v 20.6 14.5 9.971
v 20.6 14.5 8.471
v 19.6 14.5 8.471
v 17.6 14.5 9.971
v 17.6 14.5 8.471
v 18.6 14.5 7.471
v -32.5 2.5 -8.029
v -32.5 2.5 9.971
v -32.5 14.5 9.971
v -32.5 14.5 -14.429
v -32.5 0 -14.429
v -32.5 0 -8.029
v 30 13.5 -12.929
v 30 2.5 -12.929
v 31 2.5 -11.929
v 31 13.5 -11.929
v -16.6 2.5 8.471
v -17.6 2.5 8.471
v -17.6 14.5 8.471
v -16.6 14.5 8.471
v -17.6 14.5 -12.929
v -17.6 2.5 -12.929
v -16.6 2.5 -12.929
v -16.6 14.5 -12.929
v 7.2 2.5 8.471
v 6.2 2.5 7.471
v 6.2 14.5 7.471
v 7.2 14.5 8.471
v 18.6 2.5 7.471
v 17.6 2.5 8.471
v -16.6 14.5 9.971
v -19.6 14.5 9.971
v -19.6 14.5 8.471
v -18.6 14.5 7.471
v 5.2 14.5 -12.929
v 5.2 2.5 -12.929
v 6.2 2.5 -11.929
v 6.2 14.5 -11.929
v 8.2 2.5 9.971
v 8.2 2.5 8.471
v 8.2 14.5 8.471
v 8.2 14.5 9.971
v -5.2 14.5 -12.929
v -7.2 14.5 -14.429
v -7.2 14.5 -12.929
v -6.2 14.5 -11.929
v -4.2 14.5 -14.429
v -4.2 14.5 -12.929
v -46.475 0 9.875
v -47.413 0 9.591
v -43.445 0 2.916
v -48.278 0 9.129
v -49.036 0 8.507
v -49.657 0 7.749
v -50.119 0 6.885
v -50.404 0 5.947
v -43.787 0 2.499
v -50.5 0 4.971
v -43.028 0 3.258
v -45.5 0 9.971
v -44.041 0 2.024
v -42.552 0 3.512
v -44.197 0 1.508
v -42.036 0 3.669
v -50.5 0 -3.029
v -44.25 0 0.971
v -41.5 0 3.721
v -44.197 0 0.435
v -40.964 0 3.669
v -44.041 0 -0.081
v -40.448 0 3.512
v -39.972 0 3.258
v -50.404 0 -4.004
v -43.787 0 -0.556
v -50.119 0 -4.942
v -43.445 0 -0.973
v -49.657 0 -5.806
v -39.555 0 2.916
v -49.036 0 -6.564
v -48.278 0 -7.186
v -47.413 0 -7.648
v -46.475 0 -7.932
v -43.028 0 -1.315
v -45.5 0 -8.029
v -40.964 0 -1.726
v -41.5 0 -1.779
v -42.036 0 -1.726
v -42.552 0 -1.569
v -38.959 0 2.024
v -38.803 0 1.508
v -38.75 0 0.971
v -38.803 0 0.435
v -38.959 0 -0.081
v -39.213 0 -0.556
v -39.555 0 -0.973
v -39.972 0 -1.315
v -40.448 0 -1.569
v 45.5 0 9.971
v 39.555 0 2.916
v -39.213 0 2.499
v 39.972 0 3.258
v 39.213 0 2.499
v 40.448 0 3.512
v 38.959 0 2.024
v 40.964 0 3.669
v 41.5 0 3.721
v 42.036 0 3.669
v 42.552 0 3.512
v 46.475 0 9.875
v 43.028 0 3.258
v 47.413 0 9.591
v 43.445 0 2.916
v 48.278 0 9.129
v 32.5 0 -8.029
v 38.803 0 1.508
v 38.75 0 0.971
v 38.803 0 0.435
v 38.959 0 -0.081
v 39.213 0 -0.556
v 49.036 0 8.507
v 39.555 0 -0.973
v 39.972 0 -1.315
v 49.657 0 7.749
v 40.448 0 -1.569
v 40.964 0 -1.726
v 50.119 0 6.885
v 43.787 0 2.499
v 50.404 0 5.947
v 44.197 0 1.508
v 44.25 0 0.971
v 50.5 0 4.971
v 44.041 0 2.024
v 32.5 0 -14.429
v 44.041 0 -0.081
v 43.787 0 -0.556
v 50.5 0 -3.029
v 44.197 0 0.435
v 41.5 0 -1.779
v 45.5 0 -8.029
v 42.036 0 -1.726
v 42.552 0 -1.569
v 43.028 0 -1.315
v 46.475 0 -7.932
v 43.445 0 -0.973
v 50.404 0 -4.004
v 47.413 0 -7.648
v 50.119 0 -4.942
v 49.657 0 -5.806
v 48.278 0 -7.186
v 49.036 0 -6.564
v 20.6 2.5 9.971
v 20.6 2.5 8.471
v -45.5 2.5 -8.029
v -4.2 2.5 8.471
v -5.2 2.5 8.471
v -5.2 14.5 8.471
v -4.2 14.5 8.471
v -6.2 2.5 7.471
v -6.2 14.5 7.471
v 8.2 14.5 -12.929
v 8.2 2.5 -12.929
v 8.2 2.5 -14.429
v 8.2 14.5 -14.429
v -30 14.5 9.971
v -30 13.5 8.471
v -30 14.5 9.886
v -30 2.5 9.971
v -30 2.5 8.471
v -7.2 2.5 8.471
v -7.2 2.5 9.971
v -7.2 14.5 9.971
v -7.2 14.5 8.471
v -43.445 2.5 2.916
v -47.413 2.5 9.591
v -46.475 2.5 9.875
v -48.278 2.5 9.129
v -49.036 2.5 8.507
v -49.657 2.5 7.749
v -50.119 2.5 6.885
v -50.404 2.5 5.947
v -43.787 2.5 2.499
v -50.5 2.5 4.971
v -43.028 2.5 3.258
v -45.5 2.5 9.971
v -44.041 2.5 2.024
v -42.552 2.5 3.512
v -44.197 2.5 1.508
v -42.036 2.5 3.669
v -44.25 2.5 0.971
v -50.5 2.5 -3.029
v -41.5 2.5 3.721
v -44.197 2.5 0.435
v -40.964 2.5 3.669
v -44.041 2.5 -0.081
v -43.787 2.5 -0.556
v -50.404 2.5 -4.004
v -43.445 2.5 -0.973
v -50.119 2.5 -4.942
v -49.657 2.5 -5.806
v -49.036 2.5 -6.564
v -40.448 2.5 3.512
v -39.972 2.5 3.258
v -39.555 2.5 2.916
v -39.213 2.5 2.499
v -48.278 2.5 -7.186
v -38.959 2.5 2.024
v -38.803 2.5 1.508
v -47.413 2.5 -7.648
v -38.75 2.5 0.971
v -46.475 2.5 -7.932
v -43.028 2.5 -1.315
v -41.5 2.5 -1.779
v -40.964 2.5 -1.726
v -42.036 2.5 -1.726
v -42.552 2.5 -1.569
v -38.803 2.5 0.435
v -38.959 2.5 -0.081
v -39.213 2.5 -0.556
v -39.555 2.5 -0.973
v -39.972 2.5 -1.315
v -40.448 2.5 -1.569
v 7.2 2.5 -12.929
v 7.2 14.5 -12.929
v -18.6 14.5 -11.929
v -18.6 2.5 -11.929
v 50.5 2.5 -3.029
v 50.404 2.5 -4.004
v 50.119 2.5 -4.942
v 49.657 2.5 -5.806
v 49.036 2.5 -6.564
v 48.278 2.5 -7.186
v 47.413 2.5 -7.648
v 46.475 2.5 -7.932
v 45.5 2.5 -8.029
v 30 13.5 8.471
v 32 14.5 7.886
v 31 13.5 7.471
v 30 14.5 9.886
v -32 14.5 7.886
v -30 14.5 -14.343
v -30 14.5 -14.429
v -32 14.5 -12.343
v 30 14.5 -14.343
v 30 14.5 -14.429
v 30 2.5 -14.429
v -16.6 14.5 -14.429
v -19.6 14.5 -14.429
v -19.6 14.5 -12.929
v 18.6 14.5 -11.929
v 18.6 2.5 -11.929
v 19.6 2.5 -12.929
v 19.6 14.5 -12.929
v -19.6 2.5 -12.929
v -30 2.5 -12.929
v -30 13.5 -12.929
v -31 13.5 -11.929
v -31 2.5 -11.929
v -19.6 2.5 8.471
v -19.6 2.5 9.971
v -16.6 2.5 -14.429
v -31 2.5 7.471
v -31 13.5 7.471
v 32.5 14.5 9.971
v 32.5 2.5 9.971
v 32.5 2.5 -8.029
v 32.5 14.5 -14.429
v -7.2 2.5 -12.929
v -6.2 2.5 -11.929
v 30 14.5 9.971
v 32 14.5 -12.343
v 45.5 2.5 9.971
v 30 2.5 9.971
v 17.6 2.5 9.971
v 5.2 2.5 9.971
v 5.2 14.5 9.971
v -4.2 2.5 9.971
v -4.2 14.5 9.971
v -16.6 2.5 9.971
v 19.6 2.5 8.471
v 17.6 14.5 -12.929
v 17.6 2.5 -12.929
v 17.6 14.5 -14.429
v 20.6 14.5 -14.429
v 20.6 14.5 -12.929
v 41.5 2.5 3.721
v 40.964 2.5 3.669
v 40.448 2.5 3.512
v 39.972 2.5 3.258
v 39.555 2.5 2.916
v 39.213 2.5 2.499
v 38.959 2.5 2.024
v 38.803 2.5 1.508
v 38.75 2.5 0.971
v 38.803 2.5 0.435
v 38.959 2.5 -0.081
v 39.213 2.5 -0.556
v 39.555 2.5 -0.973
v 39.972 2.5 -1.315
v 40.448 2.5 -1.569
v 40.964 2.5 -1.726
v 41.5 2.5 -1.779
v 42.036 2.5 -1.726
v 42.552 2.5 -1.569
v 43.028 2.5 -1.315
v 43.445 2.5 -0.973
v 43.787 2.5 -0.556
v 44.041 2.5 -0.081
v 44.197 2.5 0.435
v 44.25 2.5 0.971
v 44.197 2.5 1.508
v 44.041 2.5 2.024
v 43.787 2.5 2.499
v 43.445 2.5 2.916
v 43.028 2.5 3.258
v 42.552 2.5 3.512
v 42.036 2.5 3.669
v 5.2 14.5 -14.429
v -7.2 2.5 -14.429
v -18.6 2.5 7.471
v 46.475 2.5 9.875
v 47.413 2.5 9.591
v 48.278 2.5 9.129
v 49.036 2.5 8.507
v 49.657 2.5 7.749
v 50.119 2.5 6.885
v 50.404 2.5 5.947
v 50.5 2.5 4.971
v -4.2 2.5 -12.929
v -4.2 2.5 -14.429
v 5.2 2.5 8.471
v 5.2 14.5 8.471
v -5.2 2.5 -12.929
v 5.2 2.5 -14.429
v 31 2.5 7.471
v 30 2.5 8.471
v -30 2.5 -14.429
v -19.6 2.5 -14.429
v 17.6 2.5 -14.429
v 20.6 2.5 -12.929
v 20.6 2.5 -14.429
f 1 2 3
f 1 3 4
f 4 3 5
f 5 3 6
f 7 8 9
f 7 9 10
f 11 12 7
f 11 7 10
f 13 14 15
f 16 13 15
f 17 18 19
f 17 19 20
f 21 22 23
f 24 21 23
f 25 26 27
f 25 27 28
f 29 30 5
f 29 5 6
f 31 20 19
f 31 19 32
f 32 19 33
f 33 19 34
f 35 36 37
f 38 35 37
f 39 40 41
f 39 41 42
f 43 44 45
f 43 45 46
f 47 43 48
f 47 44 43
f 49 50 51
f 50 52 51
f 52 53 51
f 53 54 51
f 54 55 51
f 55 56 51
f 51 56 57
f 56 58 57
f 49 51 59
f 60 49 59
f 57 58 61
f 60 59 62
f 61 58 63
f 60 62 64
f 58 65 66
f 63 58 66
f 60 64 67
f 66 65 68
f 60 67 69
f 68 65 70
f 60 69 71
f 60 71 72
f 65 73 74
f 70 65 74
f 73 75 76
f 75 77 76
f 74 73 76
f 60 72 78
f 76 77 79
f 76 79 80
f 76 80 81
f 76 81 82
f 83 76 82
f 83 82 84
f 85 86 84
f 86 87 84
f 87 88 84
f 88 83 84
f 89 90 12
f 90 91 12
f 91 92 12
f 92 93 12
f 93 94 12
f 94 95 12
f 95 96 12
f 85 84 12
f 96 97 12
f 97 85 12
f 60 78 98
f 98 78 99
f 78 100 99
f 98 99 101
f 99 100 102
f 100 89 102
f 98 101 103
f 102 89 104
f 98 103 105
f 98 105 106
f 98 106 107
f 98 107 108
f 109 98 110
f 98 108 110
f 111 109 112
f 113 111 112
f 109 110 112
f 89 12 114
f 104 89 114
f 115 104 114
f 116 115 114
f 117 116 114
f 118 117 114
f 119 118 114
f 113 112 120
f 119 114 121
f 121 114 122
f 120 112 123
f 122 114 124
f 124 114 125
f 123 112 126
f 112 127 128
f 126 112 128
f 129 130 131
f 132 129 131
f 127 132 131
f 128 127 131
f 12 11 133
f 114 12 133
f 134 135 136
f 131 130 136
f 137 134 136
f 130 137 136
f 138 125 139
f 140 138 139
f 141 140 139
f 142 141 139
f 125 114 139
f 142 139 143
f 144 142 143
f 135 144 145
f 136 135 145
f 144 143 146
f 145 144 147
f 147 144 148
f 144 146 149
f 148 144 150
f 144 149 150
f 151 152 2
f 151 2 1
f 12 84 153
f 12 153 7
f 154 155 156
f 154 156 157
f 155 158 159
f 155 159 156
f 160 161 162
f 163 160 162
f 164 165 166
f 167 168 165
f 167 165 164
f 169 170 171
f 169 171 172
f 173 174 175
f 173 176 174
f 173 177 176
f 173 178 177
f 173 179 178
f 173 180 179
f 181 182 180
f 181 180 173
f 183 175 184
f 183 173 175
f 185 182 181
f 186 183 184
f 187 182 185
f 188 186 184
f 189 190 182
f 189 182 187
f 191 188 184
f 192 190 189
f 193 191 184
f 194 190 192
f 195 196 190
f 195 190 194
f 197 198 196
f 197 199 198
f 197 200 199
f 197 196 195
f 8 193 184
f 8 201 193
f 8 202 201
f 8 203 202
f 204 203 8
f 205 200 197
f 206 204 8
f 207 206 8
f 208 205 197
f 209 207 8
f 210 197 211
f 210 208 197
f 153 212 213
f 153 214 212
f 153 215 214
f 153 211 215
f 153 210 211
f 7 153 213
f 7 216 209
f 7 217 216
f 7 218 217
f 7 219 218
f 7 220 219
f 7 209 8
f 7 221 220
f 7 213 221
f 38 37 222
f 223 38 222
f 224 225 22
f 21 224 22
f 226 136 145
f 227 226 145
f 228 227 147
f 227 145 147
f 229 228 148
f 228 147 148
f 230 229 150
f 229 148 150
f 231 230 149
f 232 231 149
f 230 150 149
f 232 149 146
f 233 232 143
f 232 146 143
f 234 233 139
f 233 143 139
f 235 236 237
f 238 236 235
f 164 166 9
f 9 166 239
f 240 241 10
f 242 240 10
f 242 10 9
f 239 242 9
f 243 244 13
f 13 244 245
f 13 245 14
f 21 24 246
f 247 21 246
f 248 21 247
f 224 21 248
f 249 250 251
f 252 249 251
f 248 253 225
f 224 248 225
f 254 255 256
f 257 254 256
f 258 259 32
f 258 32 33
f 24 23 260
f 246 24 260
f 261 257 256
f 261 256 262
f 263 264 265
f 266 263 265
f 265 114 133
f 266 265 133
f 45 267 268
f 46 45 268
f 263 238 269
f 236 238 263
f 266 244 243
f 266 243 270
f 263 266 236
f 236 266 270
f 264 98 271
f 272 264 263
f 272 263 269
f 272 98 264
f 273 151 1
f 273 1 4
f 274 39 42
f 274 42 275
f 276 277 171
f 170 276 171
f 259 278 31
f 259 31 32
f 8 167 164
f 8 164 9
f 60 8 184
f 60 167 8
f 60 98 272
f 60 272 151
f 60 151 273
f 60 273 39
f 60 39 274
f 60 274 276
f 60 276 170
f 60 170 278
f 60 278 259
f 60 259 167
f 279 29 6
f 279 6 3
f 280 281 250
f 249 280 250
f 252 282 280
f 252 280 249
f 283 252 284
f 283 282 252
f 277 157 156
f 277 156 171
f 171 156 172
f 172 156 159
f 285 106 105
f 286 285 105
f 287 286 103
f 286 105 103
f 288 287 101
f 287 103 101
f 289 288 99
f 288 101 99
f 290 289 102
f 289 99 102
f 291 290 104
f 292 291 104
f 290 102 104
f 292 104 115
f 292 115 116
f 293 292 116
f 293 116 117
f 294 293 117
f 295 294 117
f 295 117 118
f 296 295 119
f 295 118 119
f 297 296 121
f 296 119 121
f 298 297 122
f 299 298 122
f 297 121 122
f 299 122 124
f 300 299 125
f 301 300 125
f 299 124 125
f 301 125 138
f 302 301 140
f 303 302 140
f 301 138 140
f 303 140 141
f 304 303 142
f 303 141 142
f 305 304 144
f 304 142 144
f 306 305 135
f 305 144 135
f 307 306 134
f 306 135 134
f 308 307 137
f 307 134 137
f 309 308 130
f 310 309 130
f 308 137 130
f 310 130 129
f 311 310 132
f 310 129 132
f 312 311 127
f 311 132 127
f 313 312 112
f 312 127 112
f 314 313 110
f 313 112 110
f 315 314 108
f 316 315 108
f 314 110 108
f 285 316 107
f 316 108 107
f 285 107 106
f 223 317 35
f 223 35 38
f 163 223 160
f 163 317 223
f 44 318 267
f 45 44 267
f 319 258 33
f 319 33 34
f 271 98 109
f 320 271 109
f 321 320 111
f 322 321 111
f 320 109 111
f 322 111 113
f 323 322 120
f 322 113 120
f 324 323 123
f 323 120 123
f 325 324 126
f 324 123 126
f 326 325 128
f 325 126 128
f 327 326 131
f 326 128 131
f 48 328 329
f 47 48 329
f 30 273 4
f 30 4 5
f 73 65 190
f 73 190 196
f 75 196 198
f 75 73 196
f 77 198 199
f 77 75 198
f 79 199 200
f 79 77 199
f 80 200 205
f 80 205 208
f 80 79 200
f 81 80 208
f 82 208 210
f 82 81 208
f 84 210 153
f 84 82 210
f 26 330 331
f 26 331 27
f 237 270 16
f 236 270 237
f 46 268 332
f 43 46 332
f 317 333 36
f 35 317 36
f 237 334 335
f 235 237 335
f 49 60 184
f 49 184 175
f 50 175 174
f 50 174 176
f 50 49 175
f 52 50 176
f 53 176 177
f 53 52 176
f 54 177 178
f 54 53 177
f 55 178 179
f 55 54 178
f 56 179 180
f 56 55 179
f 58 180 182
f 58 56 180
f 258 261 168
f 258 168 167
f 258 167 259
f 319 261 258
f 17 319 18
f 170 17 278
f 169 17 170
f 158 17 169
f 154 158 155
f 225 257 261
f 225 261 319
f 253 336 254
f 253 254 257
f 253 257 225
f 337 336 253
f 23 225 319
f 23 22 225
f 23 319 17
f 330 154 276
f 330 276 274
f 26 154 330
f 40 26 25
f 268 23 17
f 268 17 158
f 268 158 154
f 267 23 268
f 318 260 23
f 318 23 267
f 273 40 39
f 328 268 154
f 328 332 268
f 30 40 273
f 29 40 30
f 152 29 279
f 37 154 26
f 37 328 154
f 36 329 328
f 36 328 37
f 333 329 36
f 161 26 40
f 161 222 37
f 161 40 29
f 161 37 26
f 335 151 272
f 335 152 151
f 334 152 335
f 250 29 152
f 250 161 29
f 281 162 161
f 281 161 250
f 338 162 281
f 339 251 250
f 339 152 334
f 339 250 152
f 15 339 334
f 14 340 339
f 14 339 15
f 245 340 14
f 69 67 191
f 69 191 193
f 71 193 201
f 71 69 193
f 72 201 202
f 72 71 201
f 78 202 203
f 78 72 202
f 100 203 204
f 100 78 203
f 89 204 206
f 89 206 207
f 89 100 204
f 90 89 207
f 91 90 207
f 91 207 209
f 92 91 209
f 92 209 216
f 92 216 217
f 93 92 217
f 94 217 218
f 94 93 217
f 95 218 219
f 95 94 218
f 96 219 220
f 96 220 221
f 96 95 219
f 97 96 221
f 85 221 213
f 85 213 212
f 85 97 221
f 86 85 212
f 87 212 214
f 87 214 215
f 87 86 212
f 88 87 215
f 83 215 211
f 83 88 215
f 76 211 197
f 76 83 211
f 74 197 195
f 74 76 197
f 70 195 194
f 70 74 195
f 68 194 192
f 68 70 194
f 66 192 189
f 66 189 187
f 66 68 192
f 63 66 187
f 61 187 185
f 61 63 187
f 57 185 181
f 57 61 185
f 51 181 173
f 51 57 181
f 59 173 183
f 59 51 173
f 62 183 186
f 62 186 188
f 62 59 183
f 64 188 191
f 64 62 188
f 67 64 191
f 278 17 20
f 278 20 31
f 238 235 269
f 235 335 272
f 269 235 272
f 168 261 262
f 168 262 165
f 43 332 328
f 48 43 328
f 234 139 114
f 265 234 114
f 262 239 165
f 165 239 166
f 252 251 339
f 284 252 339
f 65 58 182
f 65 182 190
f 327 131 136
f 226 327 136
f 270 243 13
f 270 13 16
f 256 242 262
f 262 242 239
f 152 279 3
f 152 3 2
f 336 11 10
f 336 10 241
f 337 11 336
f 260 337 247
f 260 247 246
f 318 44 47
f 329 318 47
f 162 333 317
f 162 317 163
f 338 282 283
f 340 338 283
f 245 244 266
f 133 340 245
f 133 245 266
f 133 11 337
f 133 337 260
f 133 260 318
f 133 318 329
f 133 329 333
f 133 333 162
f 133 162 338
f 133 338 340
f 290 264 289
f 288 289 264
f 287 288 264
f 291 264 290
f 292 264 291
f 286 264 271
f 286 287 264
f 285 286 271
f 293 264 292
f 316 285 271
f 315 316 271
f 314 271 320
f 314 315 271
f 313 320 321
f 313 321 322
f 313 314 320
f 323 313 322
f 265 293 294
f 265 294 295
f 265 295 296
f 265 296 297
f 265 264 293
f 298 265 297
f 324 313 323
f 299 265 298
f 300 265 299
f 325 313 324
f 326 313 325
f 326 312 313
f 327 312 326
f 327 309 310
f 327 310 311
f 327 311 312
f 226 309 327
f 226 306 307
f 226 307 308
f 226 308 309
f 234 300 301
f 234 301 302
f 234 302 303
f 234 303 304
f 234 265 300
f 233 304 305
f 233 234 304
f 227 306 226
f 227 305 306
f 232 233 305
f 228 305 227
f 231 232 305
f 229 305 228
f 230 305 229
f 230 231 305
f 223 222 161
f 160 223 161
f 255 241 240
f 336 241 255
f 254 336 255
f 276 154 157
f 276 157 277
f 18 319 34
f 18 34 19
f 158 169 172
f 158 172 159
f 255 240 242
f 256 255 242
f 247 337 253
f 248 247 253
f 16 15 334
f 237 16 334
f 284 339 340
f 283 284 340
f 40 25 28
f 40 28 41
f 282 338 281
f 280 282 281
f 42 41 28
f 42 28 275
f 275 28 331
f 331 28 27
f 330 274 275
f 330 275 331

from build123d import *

# Parameters (mm, degrees)
SKETCH_1_W                    = 65
SKETCH_1_H                    = 24.4
EXTRUDE_1_DEPTH               = 2.5
SKETCH_2_R                    = 2.75
EXTRUDE_2_DEPTH               = 2.5
EXTRUDE_3_DEPTH               = 12
CHAMFER_1_SIZE                = 1
EXTRUDE_4_DEPTH               = 12
PATTERN_LINEAR_1_COUNT        = 4
PATTERN_LINEAR_1_PITCH        = 12.4
PATTERN_LINEAR_1_COPY_1_DEPTH = 12
PATTERN_LINEAR_1_COPY_2_DEPTH = 12
PATTERN_LINEAR_1_COPY_3_DEPTH = 12


with BuildPart() as part:
    # Эскиз1 → Бобышка-Вытянуть1 (new body)
    with BuildSketch(Plane(origin=(0, 0, 0), x_dir=(1, 0, 0), z_dir=(0, 1, 0))):
        with Locations((0, 2.228571429)):
            Rectangle(SKETCH_1_W, SKETCH_1_H)
    extrude(amount=EXTRUDE_1_DEPTH)

    # Эскиз2 → Бобышка-Вытянуть2 (add)
    with BuildSketch(Plane(origin=(0, 0, 0), x_dir=(1, 0, 0), z_dir=(0, 1, 0))):
        with BuildLine():
            Line((-32.5, -9.971428571), (-45.5, -9.971428571))
            ThreePointArc((-45.5, -9.971428571), (-49.035533906, -8.506962477), (-50.5, -4.971428571))
            Line((-50.5, -4.971428571), (-50.5, 3.028571429))
            ThreePointArc((-50.5, 3.028571429), (-49.035533906, 6.564105335), (-45.5, 8.028571429))
            Line((-45.5, 8.028571429), (-32.5, 8.028571429))
            Line((-32.5, 8.028571429), (-32.5, -9.971428571))
        make_face()
        with Locations(Location((-41.5, -0.971428571, 0), (0, 0, 270))):
            Circle(SKETCH_2_R, mode=Mode.SUBTRACT)
    extrude_2 = extrude(amount=EXTRUDE_2_DEPTH)

    # Зеркальное отражение1: Бобышка-Вытянуть2 across plane
    add(extrude_2.mirror(Plane(origin=(0, 0, 0), x_dir=(0, 0, 1), z_dir=(1, 0, 0))))

    # Эскиз3 → Бобышка-Вытянуть3 (add)
    with BuildSketch(Plane(origin=(0, 2.5, 0), x_dir=(1, 0, 0), z_dir=(0, 1, 0))):
        Polygon((-32.5, 14.428571429), (-31, 14.428571429), (-30, 14.428571429), (-30, 12.928571429), (-31, 11.928571429), (-31, -7.471428571), (-30, -8.471428571), (-30, -9.971428571), (-31, -9.971428571), (-32.5, -9.971428571), align=None)
    extrude_3 = extrude(amount=EXTRUDE_3_DEPTH)

    # Зеркальное отражение2: Бобышка-Вытянуть3 across plane
    add(extrude_3.mirror(Plane(origin=(0, 0, 0), x_dir=(0, 0, 1), z_dir=(1, 0, 0))))

    # Фаска1
    chamfer_1_edges = [part.edges().sort_by_distance(p)[0] for p in [
        (-30.5, 14.5, 7.971428571),
        (-31, 14.5, -2.228571429),
        (-30.5, 14.5, -12.428571429),
        (30.5, 14.5, -12.428571429),
        (31, 14.5, -2.228571429),
        (30.5, 14.5, 7.971428571),
    ]]
    chamfer(chamfer_1_edges, length=CHAMFER_1_SIZE)

    # Эскиз4 → Бобышка-Вытянуть4 (add)
    with BuildSketch(Plane(origin=(0, 2.5, 0), x_dir=(1, 0, 0), z_dir=(0, 1, 0))):
        Polygon((-18.6, -9.971428571), (-19.6, -9.971428571), (-19.6, -8.471428571), (-18.6, -7.471428571), (-17.6, -8.471428571), (-16.6, -8.471428571), (-16.6, -9.971428571), align=None)
    extrude_4 = extrude(amount=EXTRUDE_4_DEPTH)

    # Зеркальное отражение3: Бобышка-Вытянуть4 across plane
    add(extrude_4.mirror(Plane.XY.offset(-2.228571429)))

    # Линейный массив1: Бобышка-Вытянуть4 ×4
    with Locations(*[(i * PATTERN_LINEAR_1_PITCH, 0, 0) for i in range(1, PATTERN_LINEAR_1_COUNT)]):
        add(extrude_4)

    # Линейный массив1 copy 1 sketch → Линейный массив1 copy 1 (add)
    with BuildSketch(Plane(origin=(12.4, 2.5, -4.457142857), x_dir=(1, 0, 0), z_dir=(0, 1, 0))):
        Polygon((-18.6, 9.971428571), (-19.6, 9.971428571), (-19.6, 8.471428571), (-18.6, 7.471428571), (-17.6, 8.471428571), (-16.6, 8.471428571), (-16.6, 9.971428571), align=None)
    extrude(amount=PATTERN_LINEAR_1_COPY_1_DEPTH)

    # Линейный массив1 copy 2 sketch → Линейный массив1 copy 2 (add)
    with BuildSketch(Plane(origin=(24.8, 2.5, -4.457142857), x_dir=(1, 0, 0), z_dir=(0, 1, 0))):
        Polygon((-18.6, 9.971428571), (-19.6, 9.971428571), (-19.6, 8.471428571), (-18.6, 7.471428571), (-17.6, 8.471428571), (-16.6, 8.471428571), (-16.6, 9.971428571), align=None)
    extrude(amount=PATTERN_LINEAR_1_COPY_2_DEPTH)

    # Линейный массив1 copy 3 sketch → Линейный массив1 copy 3 (add)
    with BuildSketch(Plane(origin=(37.2, 2.5, -4.457142857), x_dir=(1, 0, 0), z_dir=(0, 1, 0))):
        Polygon((-18.6, 9.971428571), (-19.6, 9.971428571), (-19.6, 8.471428571), (-18.6, 7.471428571), (-17.6, 8.471428571), (-16.6, 8.471428571), (-16.6, 9.971428571), align=None)
    extrude(amount=PATTERN_LINEAR_1_COPY_3_DEPTH)


solid = part.part
